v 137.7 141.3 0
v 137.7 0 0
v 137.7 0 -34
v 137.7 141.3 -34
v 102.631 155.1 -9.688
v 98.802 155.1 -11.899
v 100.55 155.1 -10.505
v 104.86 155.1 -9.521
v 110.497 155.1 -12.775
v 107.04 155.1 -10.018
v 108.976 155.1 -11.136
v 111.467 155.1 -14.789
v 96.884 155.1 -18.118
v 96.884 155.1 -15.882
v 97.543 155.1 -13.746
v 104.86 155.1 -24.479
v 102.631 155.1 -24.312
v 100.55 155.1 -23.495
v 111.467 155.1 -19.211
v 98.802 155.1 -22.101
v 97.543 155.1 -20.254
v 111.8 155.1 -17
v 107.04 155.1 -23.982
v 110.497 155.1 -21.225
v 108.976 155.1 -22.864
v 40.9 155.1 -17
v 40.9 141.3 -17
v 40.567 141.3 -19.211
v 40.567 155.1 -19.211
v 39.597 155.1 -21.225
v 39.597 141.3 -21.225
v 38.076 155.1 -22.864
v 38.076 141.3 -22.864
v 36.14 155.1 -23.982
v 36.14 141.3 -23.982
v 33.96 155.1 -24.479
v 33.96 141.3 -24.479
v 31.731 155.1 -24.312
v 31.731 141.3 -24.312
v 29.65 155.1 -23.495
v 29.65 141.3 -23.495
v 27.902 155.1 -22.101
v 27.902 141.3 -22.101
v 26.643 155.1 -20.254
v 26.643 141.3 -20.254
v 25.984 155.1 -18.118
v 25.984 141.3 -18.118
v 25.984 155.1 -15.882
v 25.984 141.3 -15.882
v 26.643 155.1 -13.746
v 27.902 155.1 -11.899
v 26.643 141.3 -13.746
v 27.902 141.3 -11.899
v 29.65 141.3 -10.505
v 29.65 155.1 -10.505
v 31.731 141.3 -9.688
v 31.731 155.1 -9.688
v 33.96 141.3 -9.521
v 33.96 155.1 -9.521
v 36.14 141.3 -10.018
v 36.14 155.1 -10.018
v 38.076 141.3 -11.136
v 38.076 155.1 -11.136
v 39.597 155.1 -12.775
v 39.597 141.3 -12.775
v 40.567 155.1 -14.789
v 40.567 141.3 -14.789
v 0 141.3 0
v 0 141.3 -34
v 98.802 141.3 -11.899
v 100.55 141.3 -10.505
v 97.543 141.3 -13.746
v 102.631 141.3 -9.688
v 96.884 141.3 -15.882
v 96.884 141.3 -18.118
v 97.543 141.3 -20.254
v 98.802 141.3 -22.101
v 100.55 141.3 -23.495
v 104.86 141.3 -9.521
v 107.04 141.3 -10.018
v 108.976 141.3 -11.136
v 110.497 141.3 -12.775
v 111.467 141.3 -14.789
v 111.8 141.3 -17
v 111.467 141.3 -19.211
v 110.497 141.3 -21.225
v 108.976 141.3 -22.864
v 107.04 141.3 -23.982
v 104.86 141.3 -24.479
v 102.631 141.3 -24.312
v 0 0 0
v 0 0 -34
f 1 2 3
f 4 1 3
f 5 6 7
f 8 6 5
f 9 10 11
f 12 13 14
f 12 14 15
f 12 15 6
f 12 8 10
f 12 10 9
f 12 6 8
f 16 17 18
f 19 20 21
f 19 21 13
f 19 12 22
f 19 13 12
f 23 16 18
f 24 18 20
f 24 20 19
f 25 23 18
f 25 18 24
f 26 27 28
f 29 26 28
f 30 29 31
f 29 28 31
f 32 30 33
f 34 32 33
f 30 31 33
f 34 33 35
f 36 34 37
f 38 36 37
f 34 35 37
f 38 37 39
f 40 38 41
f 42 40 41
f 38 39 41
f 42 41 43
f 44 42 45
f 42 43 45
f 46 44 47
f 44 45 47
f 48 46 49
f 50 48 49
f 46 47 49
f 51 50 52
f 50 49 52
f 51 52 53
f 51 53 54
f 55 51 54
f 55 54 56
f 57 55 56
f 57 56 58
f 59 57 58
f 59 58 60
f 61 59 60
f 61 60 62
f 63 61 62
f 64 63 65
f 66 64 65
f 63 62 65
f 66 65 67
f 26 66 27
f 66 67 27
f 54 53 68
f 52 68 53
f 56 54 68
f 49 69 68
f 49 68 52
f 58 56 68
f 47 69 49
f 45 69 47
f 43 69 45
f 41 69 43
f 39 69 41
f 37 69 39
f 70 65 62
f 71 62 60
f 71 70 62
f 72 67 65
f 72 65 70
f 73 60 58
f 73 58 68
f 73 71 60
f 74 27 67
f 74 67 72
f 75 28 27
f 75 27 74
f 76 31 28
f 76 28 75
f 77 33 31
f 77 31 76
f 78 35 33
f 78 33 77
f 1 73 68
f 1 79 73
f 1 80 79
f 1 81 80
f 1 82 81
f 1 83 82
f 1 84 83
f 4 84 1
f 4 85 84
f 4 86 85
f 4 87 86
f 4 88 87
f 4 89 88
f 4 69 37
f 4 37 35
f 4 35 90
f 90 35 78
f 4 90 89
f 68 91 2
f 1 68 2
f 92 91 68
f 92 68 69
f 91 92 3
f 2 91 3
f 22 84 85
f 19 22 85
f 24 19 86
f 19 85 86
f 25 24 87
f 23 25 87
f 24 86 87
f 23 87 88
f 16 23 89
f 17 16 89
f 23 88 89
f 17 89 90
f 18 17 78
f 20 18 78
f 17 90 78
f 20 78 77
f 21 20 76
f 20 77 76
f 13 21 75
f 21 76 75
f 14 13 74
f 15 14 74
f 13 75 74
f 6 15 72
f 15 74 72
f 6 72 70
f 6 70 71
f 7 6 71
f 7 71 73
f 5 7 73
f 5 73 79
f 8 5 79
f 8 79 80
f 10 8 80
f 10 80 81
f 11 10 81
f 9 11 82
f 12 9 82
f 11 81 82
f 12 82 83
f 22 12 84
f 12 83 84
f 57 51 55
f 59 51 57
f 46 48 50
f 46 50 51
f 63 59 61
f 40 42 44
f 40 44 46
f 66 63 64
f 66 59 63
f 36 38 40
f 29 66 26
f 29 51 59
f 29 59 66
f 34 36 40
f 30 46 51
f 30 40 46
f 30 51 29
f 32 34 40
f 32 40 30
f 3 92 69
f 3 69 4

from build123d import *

# Parameters (mm, degrees)
SKETCH1_W           = 137.7
SKETCH1_H           = 34
BOSS_EXTRUDE1_DEPTH = 141.3
SKETCH2_R           = 7.5
BOSS_EXTRUDE2_DEPTH = 13.8


with BuildPart() as part:
    # Sketch1 → Boss-Extrude1 (new body)
    with BuildSketch(Plane(origin=(0, 0, 0), x_dir=(1, 0, 0), z_dir=(0, 1, 0))):
        with Locations((68.85, 17)):
            Rectangle(SKETCH1_W, SKETCH1_H)
    extrude(amount=BOSS_EXTRUDE1_DEPTH)

    # Sketch2 → Boss-Extrude2 (add)
    with BuildSketch(Plane(origin=(0, 141.3, 0), x_dir=(1, 0, 0), z_dir=(0, 1, 0))):
        with Locations((33.4, 17)):
            Circle(SKETCH2_R)
        with Locations((104.3, 17)):
            Circle(SKETCH2_R)
    extrude(amount=BOSS_EXTRUDE2_DEPTH)


solid = part.part
